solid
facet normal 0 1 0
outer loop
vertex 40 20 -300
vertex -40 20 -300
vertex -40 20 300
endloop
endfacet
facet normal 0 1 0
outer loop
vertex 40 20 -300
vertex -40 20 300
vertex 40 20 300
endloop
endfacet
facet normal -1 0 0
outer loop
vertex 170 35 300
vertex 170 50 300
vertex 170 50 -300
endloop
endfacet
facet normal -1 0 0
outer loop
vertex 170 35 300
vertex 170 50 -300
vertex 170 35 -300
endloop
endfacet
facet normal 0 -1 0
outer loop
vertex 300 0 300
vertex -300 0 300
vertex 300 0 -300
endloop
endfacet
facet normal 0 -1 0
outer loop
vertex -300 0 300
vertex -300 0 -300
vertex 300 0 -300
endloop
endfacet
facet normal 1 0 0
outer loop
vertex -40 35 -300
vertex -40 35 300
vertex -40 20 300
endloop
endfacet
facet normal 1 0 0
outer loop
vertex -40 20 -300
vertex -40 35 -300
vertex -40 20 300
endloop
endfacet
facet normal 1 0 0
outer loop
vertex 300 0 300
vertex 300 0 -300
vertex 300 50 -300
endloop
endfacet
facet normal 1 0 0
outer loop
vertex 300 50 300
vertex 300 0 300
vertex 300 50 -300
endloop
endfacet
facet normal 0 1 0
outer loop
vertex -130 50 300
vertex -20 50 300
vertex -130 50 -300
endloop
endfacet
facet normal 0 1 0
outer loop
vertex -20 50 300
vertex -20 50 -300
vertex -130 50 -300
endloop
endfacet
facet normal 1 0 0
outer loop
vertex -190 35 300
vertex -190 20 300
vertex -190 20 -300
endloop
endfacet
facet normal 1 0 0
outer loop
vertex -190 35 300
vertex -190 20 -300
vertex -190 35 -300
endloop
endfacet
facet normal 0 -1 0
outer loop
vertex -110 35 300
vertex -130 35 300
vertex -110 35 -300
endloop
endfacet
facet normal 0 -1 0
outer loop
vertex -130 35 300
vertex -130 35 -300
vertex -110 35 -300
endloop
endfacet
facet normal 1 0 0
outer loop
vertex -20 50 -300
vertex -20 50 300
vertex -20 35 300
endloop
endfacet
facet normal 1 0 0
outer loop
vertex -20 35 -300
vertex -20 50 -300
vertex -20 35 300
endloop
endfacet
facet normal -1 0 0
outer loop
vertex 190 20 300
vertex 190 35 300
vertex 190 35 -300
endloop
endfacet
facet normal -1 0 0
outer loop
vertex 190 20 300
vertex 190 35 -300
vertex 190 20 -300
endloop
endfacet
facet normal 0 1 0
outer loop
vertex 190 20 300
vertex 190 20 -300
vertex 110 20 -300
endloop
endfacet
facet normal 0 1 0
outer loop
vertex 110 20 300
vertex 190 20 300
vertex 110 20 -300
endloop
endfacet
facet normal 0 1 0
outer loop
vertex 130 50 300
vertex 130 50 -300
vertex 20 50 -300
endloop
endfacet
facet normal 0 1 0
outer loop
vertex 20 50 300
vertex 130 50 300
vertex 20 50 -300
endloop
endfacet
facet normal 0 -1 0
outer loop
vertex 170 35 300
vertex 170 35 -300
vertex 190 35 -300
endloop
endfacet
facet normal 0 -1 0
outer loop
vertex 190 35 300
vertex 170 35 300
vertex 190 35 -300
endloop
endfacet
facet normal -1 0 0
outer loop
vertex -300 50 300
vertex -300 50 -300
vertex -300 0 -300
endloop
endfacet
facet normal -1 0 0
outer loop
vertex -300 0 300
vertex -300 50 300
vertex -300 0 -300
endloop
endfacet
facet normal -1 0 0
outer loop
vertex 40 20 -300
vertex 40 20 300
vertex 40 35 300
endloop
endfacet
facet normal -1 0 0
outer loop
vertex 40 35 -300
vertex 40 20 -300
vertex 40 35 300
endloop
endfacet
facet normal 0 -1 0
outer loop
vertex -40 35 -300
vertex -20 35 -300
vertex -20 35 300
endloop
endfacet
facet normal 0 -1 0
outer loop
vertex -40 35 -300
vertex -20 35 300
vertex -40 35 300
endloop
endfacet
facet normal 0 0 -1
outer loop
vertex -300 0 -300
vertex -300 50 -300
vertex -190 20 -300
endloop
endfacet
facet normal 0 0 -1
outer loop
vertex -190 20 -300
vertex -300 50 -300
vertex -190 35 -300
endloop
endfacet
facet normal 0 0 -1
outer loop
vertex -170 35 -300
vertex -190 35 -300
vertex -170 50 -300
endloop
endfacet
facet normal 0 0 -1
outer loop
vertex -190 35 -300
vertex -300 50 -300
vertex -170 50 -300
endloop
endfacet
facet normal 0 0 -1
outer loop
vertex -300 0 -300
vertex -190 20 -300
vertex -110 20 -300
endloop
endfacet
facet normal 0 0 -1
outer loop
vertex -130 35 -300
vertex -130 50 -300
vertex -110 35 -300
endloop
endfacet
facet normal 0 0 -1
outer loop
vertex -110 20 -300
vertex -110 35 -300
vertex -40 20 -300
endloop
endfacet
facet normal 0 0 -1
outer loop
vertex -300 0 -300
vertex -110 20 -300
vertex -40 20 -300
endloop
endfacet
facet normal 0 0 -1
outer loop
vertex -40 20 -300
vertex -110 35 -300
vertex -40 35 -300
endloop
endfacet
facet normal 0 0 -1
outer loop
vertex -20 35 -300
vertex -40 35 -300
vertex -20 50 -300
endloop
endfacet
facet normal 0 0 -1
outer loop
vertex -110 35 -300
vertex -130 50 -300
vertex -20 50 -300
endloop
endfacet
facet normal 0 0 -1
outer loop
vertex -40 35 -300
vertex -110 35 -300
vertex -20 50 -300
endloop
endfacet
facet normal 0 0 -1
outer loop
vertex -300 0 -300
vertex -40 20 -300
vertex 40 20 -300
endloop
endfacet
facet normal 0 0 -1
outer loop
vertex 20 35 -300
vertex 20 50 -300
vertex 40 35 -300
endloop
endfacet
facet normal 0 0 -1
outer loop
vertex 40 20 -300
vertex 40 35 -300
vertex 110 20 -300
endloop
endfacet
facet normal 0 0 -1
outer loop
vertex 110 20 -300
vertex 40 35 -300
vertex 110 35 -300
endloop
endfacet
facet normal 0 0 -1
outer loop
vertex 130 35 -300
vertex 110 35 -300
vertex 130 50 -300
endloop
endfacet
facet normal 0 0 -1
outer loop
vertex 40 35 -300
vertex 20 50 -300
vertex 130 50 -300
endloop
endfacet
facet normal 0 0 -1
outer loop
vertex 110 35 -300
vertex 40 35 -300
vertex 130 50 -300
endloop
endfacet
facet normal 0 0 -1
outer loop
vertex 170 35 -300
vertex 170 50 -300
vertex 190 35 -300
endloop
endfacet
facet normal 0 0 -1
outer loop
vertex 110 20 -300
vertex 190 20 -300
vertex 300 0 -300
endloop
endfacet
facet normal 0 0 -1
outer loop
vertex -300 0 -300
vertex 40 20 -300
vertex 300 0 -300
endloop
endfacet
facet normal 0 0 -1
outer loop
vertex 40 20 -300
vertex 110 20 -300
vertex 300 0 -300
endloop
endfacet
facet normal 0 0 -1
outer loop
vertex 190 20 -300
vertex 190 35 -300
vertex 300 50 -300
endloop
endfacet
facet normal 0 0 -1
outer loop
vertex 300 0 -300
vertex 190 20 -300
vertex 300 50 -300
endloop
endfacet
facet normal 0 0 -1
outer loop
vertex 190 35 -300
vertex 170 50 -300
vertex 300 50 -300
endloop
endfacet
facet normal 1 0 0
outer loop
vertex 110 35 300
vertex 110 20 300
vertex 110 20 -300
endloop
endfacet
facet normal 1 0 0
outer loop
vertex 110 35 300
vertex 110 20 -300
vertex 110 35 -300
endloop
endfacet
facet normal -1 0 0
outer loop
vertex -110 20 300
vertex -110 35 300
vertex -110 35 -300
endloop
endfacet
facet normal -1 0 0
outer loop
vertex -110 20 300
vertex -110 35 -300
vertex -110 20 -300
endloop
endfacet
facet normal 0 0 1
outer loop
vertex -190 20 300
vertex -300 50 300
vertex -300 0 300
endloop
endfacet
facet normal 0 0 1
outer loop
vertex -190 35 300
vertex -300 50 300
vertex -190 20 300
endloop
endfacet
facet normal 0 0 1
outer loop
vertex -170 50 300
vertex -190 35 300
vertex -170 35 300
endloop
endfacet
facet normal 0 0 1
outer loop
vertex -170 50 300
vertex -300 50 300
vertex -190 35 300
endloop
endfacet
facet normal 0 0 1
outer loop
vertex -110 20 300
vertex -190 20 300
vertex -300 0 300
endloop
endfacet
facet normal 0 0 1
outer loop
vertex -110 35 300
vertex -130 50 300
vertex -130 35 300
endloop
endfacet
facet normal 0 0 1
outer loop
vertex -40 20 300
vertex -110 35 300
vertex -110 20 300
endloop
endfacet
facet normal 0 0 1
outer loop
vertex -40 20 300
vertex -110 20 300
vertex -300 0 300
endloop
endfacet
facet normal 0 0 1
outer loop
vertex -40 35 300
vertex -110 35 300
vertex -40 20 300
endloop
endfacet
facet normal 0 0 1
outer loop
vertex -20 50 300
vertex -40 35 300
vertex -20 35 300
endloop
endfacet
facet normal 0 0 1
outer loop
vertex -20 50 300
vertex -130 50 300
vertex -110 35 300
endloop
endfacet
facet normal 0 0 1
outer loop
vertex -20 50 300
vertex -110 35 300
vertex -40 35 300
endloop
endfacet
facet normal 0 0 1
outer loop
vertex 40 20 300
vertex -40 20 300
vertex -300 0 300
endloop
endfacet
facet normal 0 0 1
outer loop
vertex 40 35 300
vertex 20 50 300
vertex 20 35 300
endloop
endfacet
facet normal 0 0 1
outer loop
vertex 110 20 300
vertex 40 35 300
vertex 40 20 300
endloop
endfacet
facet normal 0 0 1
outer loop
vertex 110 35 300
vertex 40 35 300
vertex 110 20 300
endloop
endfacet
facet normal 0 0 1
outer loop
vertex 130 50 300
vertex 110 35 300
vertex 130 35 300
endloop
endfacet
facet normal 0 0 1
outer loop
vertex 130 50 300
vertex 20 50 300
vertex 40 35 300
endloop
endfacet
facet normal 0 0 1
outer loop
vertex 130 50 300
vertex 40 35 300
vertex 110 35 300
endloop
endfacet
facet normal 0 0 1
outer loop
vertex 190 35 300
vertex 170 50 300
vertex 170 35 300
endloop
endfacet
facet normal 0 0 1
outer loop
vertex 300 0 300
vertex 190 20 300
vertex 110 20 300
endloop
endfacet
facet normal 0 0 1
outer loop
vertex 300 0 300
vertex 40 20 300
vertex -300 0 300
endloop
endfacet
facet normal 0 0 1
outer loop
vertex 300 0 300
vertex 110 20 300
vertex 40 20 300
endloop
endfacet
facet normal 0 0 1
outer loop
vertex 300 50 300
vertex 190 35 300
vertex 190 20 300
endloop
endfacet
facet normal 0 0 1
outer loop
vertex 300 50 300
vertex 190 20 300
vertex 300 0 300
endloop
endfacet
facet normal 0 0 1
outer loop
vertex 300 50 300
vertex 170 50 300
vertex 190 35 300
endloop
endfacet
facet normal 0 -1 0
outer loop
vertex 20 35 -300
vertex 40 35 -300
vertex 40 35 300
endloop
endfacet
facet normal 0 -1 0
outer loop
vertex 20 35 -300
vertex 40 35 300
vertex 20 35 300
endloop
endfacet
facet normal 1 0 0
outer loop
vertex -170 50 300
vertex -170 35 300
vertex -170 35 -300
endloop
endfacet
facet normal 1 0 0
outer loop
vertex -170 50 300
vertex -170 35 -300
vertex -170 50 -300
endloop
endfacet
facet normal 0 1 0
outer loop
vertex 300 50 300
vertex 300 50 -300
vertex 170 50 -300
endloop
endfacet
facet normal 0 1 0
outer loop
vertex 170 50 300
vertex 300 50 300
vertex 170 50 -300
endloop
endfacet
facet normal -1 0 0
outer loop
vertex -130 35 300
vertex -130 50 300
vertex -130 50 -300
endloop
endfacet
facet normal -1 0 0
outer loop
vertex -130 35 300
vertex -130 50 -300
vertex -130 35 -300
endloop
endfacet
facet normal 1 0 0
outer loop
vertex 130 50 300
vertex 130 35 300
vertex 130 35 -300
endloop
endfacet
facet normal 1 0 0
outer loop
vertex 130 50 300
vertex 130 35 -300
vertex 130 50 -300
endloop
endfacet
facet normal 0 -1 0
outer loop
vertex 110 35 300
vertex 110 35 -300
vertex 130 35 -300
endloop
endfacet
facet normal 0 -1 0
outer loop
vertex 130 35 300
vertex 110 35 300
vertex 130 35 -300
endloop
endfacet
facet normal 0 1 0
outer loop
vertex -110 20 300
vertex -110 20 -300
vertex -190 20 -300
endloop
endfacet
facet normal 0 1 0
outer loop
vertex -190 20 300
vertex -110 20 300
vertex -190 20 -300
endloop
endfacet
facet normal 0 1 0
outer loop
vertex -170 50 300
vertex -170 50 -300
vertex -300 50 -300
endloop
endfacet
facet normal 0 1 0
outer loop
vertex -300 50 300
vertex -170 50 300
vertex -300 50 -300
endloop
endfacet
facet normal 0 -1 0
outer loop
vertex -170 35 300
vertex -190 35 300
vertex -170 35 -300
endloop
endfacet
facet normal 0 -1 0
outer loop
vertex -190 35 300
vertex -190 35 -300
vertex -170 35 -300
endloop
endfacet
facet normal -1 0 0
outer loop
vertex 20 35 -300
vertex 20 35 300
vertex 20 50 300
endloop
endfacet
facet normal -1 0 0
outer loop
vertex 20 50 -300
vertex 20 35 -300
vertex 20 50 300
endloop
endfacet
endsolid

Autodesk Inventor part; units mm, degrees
ref_plane "YZ Plane" through (0, 0, 0) normal (1, 0, 0) x (0, 1, 0)
ref_plane "XZ Plane" through (0, 0, 0) normal (0, 1, 0) x (-1, 0, 0)
ref_plane "XY Plane" through (0, 0, 0) normal (0, 0, 1) x (1, 0, 0)
sketch "Sketch1" plane through (0, 0, 0) normal (0, 0, 1) x (1, 0, 0)
  line L0 (-300, 0) -> (300, 0)
  line L1 (300, 0) -> (300, 50)
  line L2 (-300, 50) -> (-300, 0)
  line L3 (-20, 50) -> (-20, 35)
  line L4 (-20, 35) -> (-40, 35)
  line L5 (-40, 35) -> (-40, 20)
  line L6 (-40, 20) -> (40, 20)
  line L7 (40, 20) -> (40, 35)
  line L8 (40, 35) -> (20, 35)
  line L9 (20, 35) -> (20, 50)
  line L10 (-75, 159.793) -> (-75, -97.8722) construction
  line L11 (75, 159.793) -> (75, -92.8199) construction
  line L12 (-130, 50) -> (-130, 35)
  line L13 (-130, 35) -> (-110, 35)
  line L14 (-110, 35) -> (-110, 20)
  line L15 (-110, 20) -> (-190, 20)
  line L16 (-190, 20) -> (-190, 35)
  line L17 (-190, 35) -> (-170, 35)
  line L18 (-170, 35) -> (-170, 50)
  line L19 (170, 50) -> (170, 35)
  line L20 (170, 35) -> (190, 35)
  line L21 (190, 35) -> (190, 20)
  line L22 (190, 20) -> (110, 20)
  line L23 (110, 20) -> (110, 35)
  line L24 (110, 35) -> (130, 35)
  line L25 (130, 35) -> (130, 50)
  line L26 (-20, 50) -> (-130, 50)
  line L27 (-170, 50) -> (-300, 50)
  line L28 (300, 50) -> (170, 50)
  line L29 (130, 50) -> (20, 50)
  point P0 (0, 0)
  dimension "d0" = 300
  dimension "d1" = 600
  dimension "d2" = 50
  dimension "d3" = 50
  dimension "d4" = 20
  dimension "d5" = 20
  dimension "d6" = 20
  dimension "d7" = 20
  dimension "d8" = 30
  dimension "d9" = 15
  dimension "d10" = 15
  dimension "d12" = 75
  dimension "d13" = 75
  dimension "d14" = 15
  dimension "d15" = 109.793
  dimension "d16" = 142.8199
  dimension "d17" = 109.793
  dimension "d18" = 147.8722
extrude "Extrusion1" add sketch "Sketch1" along normal mid plane 600
properties part number "base plate"
